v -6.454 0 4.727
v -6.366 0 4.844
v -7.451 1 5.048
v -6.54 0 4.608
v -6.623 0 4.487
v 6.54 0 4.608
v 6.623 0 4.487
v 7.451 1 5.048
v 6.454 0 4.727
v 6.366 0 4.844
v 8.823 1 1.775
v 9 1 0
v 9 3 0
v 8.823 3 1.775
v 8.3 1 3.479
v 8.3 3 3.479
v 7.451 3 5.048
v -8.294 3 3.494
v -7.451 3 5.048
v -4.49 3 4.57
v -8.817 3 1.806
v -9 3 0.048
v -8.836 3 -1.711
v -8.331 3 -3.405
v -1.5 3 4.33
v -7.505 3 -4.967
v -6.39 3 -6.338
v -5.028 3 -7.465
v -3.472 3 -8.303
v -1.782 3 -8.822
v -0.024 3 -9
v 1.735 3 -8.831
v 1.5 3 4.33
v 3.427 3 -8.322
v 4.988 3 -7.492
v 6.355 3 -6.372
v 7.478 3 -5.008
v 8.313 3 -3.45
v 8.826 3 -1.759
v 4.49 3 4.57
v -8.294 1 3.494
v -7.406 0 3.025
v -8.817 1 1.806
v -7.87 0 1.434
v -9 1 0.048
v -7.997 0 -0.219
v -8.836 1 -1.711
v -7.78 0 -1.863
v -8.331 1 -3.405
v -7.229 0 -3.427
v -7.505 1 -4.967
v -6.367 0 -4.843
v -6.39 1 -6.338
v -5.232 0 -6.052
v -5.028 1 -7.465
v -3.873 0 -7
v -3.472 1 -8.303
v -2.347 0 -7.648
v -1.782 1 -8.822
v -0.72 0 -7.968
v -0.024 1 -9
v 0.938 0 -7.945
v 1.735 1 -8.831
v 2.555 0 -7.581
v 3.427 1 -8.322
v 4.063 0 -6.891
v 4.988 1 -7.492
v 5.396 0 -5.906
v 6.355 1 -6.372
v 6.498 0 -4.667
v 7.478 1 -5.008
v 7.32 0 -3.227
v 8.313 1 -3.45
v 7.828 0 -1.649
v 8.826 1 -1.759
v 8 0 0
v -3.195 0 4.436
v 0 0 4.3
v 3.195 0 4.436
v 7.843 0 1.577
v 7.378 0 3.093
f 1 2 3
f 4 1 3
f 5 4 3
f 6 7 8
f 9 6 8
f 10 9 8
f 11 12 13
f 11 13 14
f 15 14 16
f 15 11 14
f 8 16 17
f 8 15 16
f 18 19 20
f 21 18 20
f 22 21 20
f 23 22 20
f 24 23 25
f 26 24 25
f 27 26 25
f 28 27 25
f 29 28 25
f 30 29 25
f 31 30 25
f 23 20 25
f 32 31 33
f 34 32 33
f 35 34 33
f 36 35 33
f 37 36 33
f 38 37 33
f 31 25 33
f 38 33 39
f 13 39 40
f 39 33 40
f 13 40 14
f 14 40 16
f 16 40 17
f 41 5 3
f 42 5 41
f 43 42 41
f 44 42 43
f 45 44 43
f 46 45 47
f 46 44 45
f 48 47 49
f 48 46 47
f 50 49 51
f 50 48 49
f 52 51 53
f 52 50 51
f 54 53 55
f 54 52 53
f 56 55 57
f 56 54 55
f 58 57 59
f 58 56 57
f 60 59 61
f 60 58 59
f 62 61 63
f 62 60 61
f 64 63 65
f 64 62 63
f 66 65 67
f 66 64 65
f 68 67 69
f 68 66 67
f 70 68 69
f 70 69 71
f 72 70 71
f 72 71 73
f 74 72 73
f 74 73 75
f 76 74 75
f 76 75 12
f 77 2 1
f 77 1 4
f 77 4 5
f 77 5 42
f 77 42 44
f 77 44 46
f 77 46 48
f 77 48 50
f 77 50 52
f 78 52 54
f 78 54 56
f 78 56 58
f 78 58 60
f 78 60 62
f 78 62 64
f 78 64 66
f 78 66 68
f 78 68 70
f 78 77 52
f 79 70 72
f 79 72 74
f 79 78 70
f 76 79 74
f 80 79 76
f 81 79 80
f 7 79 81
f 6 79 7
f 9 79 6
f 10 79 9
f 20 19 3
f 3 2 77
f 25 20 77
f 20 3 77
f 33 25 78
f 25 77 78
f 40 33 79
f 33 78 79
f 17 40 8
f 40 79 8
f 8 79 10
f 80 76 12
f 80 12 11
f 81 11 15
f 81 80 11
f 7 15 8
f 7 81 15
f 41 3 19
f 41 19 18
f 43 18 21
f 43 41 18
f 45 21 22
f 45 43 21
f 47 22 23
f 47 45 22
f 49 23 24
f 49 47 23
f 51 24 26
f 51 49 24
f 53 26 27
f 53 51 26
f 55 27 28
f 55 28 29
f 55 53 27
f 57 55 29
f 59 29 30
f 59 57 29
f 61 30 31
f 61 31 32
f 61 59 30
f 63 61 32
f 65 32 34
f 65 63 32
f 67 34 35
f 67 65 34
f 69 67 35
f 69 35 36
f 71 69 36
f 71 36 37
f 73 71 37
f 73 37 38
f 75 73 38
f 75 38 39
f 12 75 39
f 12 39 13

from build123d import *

# Parameters (mm, degrees)
F1_DEPTH = 3
F2_SIZE  = 1
F3_DEPTH = 3.001


with BuildPart() as f1:
    # F0 (on Front) → F1 (new body)
    with BuildSketch(Plane.XZ):
        with BuildLine():
            ThreePointArc((-7.451205, 5.047727), (-2.639996, -8.604093), (9, 0))
            ThreePointArc((9, 0), (8.604093, 2.639996), (7.451205, 5.047727))
            ThreePointArc((7.451205, 5.047727), (0, 4.3), (-7.451205, 5.047727))
        make_face()
        with BuildLine():
            ThreePointArc((-7.451205, 5.047727), (0, 4.3), (7.451205, 5.047727))
            ThreePointArc((7.451205, 5.047727), (0, 9), (-7.451205, 5.047727))
        make_face()
    extrude(amount=-F1_DEPTH)

    # F2
    f2_edges = [f1.edges().sort_by_distance(p)[0] for p in [
        (-9, 0, 0),
    ]]
    chamfer(f2_edges, length=F2_SIZE)

    # F0 (on Front) → F3 (cut, through all)
    with BuildSketch(Plane.XZ):
        with BuildLine():
            ThreePointArc((-7.451205, 5.047727), (0, 4.3), (7.451205, 5.047727))
            ThreePointArc((7.451205, 5.047727), (0, 9), (-7.451205, 5.047727))
        make_face()
    extrude(amount=-F3_DEPTH, mode=Mode.SUBTRACT)


solid = f1.part
